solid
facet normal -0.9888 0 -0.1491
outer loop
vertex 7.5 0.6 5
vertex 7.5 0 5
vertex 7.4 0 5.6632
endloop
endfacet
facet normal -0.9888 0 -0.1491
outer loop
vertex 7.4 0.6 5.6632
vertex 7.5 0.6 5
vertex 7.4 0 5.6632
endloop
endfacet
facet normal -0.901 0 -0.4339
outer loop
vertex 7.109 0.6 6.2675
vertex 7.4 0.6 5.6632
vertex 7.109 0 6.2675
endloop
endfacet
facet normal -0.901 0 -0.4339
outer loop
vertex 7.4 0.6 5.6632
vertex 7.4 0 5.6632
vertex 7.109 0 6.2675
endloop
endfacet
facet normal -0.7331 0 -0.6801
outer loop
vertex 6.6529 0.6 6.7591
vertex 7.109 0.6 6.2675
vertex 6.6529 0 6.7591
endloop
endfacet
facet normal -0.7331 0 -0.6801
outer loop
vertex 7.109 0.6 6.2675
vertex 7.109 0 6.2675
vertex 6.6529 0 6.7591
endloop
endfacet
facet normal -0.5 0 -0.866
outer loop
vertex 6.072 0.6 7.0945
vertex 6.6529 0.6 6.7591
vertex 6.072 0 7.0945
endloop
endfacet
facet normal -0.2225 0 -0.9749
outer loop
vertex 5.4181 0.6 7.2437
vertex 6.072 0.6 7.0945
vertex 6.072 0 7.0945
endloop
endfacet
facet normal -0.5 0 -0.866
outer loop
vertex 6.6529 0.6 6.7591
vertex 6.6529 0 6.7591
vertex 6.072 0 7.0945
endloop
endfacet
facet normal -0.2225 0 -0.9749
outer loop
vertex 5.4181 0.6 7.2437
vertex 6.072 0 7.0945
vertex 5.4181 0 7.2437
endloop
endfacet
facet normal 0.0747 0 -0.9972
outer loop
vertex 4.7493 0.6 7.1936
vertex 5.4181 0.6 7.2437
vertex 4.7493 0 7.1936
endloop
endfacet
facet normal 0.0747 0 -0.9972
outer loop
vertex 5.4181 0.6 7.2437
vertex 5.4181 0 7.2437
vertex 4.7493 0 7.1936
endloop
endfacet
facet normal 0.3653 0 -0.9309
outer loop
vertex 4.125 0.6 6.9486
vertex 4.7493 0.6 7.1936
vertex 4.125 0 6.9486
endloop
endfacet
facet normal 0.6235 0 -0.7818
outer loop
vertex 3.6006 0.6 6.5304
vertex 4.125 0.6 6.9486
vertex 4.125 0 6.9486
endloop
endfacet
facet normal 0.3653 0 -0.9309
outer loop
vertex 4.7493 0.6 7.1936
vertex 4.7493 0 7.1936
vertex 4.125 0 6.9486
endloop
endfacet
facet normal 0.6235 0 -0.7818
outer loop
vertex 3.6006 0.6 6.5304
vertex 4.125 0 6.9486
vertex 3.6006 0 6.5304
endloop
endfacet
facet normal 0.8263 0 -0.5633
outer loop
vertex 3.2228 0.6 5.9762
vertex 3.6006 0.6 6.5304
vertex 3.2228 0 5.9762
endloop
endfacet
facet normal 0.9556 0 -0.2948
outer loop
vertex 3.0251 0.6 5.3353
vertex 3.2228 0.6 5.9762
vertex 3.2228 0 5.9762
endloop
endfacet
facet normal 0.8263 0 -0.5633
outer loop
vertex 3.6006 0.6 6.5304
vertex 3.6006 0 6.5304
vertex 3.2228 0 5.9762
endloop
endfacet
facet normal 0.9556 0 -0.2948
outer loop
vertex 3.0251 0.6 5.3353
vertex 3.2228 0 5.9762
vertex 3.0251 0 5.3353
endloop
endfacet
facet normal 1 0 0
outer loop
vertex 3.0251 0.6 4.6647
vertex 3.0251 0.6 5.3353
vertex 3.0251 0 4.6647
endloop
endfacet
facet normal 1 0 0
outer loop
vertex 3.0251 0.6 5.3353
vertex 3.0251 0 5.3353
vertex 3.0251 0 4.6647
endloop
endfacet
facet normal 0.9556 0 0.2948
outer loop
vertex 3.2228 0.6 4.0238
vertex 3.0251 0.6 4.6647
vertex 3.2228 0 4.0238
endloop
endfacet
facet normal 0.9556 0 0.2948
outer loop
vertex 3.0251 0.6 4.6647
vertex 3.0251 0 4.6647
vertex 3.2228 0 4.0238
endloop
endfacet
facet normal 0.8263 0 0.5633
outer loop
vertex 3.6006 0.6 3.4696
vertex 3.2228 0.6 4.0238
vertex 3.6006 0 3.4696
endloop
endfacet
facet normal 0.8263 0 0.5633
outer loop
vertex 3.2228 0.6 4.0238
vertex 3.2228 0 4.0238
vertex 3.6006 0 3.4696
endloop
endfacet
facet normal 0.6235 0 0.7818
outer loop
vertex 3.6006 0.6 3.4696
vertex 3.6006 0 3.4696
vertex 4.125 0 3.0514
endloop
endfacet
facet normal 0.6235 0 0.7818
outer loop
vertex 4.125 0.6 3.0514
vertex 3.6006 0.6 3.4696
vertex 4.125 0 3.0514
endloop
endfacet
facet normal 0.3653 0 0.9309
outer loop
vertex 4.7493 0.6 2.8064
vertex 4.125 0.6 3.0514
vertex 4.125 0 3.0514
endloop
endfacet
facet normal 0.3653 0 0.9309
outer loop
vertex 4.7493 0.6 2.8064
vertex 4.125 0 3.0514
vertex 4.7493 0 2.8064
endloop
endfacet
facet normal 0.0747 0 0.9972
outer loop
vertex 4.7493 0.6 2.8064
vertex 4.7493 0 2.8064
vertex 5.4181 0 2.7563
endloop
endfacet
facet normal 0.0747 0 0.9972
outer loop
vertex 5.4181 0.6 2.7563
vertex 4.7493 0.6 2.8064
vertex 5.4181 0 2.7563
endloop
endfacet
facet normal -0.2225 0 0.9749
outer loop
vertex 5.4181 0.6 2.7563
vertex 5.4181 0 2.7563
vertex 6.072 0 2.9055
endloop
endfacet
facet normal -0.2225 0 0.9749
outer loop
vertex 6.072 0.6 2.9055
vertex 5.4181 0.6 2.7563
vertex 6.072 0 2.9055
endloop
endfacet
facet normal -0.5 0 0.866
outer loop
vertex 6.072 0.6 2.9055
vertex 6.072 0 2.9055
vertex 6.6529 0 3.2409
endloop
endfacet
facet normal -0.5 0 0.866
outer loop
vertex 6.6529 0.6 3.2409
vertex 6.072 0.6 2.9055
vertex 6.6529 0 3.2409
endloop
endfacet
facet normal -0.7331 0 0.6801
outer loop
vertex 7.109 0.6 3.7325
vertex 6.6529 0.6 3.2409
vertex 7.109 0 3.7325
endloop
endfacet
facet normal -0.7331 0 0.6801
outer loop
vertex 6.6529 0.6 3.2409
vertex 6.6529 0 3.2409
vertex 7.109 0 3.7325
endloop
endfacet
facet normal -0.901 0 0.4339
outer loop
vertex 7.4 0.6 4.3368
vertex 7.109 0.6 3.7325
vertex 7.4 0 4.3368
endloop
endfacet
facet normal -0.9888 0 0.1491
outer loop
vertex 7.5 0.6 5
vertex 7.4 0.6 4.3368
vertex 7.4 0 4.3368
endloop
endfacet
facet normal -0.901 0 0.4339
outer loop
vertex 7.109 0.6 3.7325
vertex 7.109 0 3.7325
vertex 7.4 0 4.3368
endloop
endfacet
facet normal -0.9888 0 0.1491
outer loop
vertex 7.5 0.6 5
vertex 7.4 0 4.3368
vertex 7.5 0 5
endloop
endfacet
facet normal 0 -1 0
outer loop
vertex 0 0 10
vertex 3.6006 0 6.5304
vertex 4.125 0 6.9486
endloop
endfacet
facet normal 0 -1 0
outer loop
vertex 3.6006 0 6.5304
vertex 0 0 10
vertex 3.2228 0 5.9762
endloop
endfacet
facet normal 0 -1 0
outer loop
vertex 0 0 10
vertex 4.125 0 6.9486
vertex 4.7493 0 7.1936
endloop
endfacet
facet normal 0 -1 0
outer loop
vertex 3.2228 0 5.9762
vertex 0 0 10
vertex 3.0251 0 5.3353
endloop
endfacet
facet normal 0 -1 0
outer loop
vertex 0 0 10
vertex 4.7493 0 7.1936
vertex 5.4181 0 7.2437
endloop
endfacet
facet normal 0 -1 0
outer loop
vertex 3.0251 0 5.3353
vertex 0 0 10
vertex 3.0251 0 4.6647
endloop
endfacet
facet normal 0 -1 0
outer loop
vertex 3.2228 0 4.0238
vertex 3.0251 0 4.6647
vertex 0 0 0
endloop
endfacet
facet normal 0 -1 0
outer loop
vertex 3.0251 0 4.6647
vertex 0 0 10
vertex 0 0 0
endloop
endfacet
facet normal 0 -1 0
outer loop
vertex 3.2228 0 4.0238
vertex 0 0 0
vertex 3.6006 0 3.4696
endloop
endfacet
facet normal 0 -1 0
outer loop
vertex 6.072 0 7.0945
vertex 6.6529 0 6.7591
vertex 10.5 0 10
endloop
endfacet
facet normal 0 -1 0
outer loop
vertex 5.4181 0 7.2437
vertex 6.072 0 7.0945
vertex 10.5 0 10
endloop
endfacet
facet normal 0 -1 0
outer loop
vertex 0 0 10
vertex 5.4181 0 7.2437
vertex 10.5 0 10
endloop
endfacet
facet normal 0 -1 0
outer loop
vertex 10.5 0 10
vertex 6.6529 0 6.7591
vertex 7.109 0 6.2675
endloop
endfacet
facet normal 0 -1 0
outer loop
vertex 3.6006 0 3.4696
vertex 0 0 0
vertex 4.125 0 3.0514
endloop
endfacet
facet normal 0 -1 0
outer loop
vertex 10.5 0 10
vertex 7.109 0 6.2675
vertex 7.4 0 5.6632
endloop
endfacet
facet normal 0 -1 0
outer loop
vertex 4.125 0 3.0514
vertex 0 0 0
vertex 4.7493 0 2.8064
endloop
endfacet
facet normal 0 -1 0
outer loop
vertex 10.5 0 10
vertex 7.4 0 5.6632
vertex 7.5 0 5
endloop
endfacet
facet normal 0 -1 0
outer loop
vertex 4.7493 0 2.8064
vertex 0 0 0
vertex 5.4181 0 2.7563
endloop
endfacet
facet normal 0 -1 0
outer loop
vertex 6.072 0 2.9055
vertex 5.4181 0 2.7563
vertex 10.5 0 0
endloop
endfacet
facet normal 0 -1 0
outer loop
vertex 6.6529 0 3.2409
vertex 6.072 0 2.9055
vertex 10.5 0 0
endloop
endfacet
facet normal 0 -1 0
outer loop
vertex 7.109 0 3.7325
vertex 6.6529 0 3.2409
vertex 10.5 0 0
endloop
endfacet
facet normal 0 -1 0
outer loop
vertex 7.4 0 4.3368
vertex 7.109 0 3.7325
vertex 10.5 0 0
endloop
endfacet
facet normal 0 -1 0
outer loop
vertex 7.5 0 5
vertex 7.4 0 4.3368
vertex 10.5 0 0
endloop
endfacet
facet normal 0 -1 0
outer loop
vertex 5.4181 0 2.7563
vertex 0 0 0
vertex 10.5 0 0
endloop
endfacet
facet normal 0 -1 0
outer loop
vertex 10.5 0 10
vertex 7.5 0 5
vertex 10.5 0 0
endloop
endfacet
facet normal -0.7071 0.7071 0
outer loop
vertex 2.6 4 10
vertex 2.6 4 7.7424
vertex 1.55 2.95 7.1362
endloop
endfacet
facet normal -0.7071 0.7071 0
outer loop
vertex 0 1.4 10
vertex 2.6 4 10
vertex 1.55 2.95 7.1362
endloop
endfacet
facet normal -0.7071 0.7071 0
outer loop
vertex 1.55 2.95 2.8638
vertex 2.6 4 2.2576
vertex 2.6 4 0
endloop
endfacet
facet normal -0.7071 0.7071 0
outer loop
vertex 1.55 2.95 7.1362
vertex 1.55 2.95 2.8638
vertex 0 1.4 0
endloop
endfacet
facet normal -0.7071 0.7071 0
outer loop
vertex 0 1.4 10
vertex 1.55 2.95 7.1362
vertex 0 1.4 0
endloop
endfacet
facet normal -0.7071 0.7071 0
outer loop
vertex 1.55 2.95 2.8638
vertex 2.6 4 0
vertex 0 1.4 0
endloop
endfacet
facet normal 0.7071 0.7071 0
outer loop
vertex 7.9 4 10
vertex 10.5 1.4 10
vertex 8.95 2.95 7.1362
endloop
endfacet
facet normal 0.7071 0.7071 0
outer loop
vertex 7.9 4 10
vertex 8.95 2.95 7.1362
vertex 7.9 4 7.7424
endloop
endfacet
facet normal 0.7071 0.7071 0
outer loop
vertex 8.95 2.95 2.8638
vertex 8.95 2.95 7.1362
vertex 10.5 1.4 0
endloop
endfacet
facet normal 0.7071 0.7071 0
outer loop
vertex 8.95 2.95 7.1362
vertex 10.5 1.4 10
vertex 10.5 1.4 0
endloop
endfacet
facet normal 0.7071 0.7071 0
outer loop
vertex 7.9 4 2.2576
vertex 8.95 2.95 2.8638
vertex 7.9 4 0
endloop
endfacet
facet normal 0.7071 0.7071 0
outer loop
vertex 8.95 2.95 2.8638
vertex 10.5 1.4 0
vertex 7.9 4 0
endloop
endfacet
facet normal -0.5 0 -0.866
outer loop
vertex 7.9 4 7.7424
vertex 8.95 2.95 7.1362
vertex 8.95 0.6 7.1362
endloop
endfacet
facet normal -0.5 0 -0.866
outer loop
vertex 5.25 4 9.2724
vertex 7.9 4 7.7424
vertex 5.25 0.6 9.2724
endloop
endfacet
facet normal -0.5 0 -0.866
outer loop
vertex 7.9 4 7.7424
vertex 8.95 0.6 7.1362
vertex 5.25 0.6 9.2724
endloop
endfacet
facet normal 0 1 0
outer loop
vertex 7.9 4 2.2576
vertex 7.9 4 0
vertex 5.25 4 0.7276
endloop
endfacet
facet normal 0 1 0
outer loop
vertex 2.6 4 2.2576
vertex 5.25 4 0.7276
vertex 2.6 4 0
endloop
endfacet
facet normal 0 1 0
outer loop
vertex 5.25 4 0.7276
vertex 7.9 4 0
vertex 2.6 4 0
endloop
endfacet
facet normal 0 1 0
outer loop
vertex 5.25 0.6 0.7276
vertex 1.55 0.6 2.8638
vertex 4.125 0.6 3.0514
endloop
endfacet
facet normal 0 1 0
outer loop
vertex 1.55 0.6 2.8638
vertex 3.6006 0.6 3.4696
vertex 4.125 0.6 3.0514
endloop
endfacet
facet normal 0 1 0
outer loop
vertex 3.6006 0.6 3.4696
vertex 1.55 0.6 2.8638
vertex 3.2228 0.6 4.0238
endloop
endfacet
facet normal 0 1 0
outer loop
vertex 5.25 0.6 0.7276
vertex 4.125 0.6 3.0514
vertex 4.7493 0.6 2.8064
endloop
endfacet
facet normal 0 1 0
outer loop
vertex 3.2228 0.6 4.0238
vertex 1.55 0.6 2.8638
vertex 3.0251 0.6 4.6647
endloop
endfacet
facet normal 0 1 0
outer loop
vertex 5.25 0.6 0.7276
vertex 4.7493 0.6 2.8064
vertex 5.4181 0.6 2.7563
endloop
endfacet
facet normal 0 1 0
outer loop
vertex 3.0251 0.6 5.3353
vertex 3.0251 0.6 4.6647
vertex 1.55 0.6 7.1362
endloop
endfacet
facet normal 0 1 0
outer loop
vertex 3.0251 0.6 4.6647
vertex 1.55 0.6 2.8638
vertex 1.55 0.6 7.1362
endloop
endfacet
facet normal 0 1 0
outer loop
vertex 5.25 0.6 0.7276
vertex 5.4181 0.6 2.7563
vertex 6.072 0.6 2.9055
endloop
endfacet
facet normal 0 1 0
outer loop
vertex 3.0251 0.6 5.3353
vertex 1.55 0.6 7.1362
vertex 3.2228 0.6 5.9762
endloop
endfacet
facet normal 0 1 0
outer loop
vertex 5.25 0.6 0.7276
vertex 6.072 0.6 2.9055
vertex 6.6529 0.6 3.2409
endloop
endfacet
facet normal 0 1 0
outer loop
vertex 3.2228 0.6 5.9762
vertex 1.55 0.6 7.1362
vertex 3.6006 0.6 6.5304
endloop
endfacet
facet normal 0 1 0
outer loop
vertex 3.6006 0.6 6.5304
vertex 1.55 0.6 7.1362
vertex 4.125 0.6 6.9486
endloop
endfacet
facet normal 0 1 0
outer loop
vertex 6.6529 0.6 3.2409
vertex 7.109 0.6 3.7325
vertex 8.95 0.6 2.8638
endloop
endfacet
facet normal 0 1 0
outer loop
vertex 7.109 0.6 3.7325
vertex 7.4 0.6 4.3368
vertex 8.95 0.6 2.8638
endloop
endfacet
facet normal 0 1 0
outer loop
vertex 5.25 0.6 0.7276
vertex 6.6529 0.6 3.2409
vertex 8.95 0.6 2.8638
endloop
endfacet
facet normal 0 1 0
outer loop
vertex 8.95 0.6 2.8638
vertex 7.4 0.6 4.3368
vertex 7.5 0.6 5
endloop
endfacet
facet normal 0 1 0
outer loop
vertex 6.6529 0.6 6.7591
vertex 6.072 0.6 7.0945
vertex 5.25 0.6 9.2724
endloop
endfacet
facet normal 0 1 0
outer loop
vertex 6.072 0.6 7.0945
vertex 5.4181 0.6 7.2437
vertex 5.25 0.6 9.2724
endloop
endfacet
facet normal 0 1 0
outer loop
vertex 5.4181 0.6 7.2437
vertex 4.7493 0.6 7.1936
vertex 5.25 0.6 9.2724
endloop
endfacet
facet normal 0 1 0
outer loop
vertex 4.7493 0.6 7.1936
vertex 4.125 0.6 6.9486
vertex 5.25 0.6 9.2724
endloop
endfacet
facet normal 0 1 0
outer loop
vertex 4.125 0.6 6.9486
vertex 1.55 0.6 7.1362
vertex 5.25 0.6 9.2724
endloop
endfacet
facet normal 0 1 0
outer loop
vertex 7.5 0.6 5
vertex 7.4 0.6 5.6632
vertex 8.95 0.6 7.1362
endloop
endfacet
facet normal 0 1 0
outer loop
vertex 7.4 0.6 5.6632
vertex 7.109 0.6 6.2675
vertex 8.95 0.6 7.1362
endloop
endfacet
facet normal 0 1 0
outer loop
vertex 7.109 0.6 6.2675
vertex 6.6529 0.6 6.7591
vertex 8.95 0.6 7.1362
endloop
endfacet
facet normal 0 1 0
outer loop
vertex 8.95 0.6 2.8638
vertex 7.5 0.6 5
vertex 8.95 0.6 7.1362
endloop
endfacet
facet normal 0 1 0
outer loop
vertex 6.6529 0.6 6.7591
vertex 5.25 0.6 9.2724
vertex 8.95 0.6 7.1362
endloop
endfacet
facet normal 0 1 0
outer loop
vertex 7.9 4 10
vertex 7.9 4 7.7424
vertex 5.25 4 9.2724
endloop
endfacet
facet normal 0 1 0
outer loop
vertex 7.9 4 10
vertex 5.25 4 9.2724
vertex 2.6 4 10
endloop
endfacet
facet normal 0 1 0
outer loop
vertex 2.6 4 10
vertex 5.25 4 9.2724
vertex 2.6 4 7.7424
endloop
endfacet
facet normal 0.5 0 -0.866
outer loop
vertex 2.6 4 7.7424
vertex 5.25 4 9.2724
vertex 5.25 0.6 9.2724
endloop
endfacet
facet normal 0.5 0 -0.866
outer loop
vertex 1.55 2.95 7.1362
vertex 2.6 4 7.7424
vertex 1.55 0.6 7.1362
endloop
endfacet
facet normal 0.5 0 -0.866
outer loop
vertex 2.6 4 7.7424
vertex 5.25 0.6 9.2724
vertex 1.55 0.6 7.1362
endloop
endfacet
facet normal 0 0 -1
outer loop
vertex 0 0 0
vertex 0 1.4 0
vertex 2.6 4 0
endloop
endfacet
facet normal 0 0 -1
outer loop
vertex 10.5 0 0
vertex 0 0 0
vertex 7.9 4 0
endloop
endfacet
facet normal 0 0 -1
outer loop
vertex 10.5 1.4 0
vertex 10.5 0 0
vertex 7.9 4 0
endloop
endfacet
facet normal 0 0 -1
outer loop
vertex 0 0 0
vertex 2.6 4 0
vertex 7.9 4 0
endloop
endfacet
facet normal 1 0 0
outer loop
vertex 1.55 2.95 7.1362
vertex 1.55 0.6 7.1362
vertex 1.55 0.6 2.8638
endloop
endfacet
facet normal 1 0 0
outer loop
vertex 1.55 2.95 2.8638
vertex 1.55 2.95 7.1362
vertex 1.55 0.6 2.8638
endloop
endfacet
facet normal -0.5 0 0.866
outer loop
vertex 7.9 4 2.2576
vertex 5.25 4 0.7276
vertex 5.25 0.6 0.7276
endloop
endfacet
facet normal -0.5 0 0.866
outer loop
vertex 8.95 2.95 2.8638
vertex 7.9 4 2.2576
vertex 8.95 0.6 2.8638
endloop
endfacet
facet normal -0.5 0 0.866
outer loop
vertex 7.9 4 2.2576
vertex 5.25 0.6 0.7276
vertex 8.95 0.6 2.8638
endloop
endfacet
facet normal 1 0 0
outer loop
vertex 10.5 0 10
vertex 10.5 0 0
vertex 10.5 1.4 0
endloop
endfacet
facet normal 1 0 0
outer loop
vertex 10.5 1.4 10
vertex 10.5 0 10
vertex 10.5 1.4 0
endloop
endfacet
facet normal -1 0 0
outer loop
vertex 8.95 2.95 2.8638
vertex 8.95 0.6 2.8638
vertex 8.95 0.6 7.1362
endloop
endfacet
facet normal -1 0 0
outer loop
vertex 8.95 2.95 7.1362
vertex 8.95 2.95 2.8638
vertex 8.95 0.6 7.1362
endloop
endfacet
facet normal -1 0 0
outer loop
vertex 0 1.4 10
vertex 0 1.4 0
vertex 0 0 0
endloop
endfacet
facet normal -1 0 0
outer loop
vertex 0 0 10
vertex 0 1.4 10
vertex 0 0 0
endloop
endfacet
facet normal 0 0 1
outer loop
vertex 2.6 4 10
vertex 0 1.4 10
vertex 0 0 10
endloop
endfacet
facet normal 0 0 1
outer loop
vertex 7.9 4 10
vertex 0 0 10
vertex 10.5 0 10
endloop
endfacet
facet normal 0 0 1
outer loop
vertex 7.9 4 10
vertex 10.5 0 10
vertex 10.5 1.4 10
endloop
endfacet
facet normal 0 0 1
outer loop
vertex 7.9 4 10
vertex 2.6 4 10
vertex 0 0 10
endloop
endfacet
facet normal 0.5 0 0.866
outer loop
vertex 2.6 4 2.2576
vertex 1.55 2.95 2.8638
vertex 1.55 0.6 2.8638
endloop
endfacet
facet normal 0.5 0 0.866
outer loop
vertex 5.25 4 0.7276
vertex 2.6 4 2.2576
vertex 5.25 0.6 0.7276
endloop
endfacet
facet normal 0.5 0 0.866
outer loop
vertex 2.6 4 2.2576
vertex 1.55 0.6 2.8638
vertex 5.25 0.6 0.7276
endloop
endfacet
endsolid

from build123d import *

# Parameters (mm, degrees)
F1_DEPTH = 10
F3_START = -0.6
F2_R     = 2.25
F3_DEPTH = 3.401
F4_DEPTH = 0.6


with BuildPart() as f1:
    # F0 (on Top) → F1 (new body)
    with BuildSketch(Plane.XY):
        Polygon((0, 1.4), (0, 0), (10.5, 0), (10.5, 1.4), (7.9, 4), (2.6, 4), align=None)
    extrude(amount=F1_DEPTH)

    # F2 (on face) → F3 (cut)
    with BuildSketch(Plane.XZ.offset(F3_START)):
        Polygon((8.95, 2.863804004), (8.95, 7.136195996), (5.25, 9.272391992), (1.55, 7.136195996), (1.55, 2.863804004), (5.25, 0.727608008), align=None)
        with Locations((5.25, 5)):
            Circle(F2_R, mode=Mode.SUBTRACT)
        with Locations((5.25, 5)):
            Circle(F2_R)
    extrude(amount=-F3_DEPTH, mode=Mode.SUBTRACT)

    # F2 (on face) → F4 (cut, through all)
    with BuildSketch(Plane.XZ):
        with Locations((5.25, 5)):
            Circle(F2_R)
    extrude(amount=-F4_DEPTH, mode=Mode.SUBTRACT)


solid = f1.part
